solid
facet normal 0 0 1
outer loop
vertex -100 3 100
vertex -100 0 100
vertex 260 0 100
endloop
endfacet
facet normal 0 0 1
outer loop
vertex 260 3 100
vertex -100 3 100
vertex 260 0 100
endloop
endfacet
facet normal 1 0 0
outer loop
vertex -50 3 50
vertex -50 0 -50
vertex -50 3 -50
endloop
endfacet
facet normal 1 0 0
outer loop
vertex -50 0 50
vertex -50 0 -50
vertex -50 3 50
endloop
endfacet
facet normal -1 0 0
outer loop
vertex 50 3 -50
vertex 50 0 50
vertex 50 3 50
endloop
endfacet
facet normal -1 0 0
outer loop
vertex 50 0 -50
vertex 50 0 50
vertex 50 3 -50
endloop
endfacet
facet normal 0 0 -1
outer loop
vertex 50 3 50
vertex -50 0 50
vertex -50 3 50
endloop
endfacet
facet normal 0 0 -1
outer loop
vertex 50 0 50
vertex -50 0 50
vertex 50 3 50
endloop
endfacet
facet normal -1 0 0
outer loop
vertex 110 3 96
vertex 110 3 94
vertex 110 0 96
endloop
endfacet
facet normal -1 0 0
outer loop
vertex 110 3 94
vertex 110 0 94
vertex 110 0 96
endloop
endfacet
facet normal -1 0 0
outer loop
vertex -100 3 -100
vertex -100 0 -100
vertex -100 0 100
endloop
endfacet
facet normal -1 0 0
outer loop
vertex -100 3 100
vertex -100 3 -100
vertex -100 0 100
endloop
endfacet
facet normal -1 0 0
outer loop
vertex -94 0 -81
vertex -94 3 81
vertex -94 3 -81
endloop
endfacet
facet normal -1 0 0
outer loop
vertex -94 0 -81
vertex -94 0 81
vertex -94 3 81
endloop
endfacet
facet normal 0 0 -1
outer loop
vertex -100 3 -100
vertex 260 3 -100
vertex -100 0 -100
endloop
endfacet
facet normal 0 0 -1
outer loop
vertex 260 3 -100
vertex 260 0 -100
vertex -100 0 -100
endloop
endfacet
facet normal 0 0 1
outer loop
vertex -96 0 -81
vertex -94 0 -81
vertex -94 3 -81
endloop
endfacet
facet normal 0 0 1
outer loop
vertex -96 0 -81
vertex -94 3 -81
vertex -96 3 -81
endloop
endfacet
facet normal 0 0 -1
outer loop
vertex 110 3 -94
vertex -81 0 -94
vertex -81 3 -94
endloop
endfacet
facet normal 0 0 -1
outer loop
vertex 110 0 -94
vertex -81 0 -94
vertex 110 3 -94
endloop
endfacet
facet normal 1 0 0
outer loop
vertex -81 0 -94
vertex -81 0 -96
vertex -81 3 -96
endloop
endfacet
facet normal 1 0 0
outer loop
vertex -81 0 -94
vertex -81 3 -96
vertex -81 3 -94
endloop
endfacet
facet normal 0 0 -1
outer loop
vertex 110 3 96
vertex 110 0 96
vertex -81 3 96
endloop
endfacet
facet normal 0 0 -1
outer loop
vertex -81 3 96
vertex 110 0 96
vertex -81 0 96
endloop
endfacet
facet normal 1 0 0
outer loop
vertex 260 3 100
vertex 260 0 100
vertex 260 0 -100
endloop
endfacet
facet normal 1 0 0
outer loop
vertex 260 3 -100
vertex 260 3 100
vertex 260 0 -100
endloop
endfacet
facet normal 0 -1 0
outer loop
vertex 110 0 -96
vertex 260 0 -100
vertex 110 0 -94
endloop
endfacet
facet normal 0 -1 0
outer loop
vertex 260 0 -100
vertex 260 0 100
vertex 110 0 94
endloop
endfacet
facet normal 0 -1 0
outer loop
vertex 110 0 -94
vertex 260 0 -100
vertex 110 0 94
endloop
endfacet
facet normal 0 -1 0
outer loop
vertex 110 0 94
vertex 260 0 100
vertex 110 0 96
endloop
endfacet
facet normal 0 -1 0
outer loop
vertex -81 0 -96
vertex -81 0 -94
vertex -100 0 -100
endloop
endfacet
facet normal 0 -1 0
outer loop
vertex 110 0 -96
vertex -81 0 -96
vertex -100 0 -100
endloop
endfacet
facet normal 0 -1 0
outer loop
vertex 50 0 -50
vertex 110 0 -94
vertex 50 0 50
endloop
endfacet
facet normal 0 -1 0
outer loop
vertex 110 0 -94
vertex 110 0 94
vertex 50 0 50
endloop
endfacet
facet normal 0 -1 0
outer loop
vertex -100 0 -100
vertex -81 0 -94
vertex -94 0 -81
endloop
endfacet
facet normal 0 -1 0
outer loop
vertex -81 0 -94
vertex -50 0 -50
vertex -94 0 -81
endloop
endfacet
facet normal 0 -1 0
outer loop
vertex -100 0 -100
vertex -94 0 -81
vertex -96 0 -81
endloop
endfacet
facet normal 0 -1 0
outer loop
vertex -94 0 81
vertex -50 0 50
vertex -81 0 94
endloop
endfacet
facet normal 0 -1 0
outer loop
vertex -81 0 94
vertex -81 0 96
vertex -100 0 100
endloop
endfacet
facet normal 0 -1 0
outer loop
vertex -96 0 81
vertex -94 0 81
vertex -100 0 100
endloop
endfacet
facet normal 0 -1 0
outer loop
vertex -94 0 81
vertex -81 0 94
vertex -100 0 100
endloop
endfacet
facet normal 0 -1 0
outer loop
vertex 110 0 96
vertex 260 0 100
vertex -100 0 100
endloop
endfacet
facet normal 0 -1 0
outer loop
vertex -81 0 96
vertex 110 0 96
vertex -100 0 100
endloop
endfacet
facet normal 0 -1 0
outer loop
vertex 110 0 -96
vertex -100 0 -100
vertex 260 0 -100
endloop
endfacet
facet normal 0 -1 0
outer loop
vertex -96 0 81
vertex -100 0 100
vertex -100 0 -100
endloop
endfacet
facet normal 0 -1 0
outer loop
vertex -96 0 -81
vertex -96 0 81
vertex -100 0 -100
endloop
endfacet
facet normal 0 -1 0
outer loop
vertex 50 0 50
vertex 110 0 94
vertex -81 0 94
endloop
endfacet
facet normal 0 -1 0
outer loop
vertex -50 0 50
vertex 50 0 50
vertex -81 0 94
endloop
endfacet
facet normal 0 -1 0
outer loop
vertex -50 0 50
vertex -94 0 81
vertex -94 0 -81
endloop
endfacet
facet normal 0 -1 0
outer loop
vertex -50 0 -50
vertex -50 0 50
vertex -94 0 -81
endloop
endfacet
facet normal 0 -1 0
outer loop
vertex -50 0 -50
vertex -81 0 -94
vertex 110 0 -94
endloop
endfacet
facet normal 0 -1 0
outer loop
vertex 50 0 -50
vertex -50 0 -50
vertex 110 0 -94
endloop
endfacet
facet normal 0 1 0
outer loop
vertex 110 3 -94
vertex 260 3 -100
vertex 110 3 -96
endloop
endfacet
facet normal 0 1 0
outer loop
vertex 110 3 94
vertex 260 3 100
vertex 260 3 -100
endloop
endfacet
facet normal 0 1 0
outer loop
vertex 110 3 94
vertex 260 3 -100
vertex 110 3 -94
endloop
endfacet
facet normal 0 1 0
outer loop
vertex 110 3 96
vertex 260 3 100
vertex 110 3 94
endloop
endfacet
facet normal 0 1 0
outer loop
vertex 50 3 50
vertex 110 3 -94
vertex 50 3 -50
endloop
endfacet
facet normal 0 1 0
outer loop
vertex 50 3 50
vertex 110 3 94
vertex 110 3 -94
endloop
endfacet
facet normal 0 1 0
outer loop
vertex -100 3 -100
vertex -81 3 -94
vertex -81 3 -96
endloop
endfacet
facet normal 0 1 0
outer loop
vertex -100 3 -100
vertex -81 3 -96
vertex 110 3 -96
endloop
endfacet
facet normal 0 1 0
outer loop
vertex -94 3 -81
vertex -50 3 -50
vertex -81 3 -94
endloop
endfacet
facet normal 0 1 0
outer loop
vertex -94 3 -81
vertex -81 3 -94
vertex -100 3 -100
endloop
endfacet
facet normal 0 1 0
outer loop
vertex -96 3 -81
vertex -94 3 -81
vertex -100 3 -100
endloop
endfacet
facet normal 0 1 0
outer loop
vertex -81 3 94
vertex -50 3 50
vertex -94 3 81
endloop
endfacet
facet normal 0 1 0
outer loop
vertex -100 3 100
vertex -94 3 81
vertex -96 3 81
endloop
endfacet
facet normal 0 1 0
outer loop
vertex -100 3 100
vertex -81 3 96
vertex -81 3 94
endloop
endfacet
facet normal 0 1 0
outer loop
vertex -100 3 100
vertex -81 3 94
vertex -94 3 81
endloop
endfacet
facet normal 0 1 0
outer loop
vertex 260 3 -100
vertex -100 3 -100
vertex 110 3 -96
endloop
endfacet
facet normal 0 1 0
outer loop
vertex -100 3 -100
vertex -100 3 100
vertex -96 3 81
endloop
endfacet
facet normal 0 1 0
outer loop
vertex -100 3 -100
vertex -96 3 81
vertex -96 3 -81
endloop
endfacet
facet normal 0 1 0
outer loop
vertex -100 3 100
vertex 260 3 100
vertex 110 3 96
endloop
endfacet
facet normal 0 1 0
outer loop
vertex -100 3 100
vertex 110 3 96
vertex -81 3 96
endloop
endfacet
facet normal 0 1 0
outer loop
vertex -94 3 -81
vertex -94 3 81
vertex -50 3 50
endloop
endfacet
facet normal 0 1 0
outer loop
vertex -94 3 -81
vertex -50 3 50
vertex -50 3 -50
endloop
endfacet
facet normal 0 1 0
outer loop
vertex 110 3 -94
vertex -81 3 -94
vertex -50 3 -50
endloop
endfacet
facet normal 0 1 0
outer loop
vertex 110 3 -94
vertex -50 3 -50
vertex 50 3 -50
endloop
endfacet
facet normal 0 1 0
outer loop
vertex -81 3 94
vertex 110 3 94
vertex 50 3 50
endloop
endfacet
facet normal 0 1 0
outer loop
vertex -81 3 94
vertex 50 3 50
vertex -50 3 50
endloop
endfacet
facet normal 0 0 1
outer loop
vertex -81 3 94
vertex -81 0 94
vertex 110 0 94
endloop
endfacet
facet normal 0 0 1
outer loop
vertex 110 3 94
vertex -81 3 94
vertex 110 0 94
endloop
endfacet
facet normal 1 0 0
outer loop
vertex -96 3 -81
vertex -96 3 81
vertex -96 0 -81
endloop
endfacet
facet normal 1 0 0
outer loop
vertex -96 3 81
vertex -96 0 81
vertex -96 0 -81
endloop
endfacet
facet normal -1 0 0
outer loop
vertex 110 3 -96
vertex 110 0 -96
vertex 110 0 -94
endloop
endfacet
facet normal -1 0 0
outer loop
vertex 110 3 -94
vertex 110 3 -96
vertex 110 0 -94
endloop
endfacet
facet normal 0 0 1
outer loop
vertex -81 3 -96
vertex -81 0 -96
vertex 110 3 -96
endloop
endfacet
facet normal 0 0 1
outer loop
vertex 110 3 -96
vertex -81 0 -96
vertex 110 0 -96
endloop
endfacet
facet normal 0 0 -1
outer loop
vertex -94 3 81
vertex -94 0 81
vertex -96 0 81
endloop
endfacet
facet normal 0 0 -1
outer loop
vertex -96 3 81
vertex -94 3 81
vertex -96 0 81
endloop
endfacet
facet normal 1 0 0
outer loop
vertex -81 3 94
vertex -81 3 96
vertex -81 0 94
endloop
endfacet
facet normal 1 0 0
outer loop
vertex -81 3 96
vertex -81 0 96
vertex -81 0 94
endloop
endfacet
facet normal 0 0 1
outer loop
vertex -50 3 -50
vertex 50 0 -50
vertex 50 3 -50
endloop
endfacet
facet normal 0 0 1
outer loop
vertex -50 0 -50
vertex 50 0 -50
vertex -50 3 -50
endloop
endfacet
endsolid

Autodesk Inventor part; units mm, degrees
ref_plane "YZ Plane" through (0, 0, 0) normal (1, 0, 0) x (0, 1, 0)
ref_plane "XZ Plane" through (0, 0, 0) normal (0, 1, 0) x (-1, 0, 0)
ref_plane "XY Plane" through (0, 0, 0) normal (0, 0, 1) x (1, 0, 0)
sketch "Sketch1" plane through (0, 0, 0) normal (0, 1, 0) x (-1, 0, 0)
  line L0 (50, 50) -> (-50, 50)
  line L1 (-50, 50) -> (-50, -50)
  line L2 (-50, -50) -> (50, -50)
  line L3 (50, -50) -> (50, 50)
  line L4 (50, 50) -> (-50, -50) construction
  line L5 (-50, 50) -> (50, -50) construction
  line L6 (100, 100) -> (-100, 100)
  line L7 (-100, 100) -> (-100, -100)
  line L8 (-100, -100) -> (100, -100)
  line L9 (100, -100) -> (100, 100)
  line L10 (100, 100) -> (-100, -100) construction
  line L11 (-100, 100) -> (100, -100) construction
  line L12 (-50, 100) -> (-260, 100)
  line L13 (-260, 100) -> (-260, -100)
  line L14 (-260, -100) -> (-50, -100)
  line L15 (-50, -100) -> (-50, 100)
  point P0 (0, 0)
  dimension "d0" = 100
  dimension "d1" = 100
  dimension "d2" = 200
  dimension "d3" = 50
  dimension "d4" = 210
  dimension "d5" = 0
  dimension "d6" = 200
extrude "Extrusion1" add sketch "Sketch1" along normal blind 3 contours L0 L15 L6 L9 L8 L2 L3 | L1 L15 L8 L7 L6 | L7 L14 L13 L12
sketch "Sketch3" plane through (0, 0, 0) normal (0, -1, 0) x (1, 0, 0)
  line L0 (110, 96) -> (-96, 96)
  line L1 (-96, 96) -> (-96, -96)
  line L2 (-96, -96) -> (110, -96)
  line L3 (110, -96) -> (110, 96)
  line L4 (-94, -94) -> (108, -94)
  line L5 (108, -94) -> (108, 94)
  line L6 (108, 94) -> (-94, 94)
  line L7 (-94, 94) -> (-94, -94)
  line L8 (-100, -100) -> (-100, 100) projected
  line L9 (260, -100) -> (-100, -100) projected
  line L10 (-100, 100) -> (260, 100) projected
  line L11 (260, 100) -> (260, -100) projected
  line L12 (108, 94) -> (110, 94)
  line L13 (108, -94) -> (110, -94)
  line L14 (-96, 96) -> (-81, 96)
  line L15 (-81, 96) -> (-81, 81)
  line L16 (-81, 81) -> (-96, 81)
  line L17 (-96, 81) -> (-96, 96)
  line L18 (-96, -96) -> (-81, -96)
  line L19 (-81, -96) -> (-81, -81)
  line L20 (-81, -81) -> (-96, -81)
  line L21 (-96, -81) -> (-96, -96)
  point P0 (0, 0)
  point P1 (-81, -94)
  point P2 (-94, -81)
  point P3 (-94, 81)
  point P4 (-81, 94)
  dimension "d13" = 2
  dimension "d14" = 2
  dimension "d15" = 4
  dimension "d16" = 4
  dimension "d17" = 4
  dimension "d18" = 2
  dimension "d19" = 150
  dimension "d20" = 2
  dimension "d21" = 15
  dimension "d22" = 15
  dimension "d23" = 15
  dimension "d24" = 15
extrude "Extrusion3" cut sketch "Sketch3" against normal blind 10 contours L3 L12 L6 L15 L0 | L3 L2 L19 L4 L13 | L16 L7 L20 L1
equation "\"d14\" = d13"
equation "\"d18\" = d13"
equation "\"d20\" = d14"
equation "\"d24\" = d21"
properties part number "BottomPlateRS3" material "Steel"
